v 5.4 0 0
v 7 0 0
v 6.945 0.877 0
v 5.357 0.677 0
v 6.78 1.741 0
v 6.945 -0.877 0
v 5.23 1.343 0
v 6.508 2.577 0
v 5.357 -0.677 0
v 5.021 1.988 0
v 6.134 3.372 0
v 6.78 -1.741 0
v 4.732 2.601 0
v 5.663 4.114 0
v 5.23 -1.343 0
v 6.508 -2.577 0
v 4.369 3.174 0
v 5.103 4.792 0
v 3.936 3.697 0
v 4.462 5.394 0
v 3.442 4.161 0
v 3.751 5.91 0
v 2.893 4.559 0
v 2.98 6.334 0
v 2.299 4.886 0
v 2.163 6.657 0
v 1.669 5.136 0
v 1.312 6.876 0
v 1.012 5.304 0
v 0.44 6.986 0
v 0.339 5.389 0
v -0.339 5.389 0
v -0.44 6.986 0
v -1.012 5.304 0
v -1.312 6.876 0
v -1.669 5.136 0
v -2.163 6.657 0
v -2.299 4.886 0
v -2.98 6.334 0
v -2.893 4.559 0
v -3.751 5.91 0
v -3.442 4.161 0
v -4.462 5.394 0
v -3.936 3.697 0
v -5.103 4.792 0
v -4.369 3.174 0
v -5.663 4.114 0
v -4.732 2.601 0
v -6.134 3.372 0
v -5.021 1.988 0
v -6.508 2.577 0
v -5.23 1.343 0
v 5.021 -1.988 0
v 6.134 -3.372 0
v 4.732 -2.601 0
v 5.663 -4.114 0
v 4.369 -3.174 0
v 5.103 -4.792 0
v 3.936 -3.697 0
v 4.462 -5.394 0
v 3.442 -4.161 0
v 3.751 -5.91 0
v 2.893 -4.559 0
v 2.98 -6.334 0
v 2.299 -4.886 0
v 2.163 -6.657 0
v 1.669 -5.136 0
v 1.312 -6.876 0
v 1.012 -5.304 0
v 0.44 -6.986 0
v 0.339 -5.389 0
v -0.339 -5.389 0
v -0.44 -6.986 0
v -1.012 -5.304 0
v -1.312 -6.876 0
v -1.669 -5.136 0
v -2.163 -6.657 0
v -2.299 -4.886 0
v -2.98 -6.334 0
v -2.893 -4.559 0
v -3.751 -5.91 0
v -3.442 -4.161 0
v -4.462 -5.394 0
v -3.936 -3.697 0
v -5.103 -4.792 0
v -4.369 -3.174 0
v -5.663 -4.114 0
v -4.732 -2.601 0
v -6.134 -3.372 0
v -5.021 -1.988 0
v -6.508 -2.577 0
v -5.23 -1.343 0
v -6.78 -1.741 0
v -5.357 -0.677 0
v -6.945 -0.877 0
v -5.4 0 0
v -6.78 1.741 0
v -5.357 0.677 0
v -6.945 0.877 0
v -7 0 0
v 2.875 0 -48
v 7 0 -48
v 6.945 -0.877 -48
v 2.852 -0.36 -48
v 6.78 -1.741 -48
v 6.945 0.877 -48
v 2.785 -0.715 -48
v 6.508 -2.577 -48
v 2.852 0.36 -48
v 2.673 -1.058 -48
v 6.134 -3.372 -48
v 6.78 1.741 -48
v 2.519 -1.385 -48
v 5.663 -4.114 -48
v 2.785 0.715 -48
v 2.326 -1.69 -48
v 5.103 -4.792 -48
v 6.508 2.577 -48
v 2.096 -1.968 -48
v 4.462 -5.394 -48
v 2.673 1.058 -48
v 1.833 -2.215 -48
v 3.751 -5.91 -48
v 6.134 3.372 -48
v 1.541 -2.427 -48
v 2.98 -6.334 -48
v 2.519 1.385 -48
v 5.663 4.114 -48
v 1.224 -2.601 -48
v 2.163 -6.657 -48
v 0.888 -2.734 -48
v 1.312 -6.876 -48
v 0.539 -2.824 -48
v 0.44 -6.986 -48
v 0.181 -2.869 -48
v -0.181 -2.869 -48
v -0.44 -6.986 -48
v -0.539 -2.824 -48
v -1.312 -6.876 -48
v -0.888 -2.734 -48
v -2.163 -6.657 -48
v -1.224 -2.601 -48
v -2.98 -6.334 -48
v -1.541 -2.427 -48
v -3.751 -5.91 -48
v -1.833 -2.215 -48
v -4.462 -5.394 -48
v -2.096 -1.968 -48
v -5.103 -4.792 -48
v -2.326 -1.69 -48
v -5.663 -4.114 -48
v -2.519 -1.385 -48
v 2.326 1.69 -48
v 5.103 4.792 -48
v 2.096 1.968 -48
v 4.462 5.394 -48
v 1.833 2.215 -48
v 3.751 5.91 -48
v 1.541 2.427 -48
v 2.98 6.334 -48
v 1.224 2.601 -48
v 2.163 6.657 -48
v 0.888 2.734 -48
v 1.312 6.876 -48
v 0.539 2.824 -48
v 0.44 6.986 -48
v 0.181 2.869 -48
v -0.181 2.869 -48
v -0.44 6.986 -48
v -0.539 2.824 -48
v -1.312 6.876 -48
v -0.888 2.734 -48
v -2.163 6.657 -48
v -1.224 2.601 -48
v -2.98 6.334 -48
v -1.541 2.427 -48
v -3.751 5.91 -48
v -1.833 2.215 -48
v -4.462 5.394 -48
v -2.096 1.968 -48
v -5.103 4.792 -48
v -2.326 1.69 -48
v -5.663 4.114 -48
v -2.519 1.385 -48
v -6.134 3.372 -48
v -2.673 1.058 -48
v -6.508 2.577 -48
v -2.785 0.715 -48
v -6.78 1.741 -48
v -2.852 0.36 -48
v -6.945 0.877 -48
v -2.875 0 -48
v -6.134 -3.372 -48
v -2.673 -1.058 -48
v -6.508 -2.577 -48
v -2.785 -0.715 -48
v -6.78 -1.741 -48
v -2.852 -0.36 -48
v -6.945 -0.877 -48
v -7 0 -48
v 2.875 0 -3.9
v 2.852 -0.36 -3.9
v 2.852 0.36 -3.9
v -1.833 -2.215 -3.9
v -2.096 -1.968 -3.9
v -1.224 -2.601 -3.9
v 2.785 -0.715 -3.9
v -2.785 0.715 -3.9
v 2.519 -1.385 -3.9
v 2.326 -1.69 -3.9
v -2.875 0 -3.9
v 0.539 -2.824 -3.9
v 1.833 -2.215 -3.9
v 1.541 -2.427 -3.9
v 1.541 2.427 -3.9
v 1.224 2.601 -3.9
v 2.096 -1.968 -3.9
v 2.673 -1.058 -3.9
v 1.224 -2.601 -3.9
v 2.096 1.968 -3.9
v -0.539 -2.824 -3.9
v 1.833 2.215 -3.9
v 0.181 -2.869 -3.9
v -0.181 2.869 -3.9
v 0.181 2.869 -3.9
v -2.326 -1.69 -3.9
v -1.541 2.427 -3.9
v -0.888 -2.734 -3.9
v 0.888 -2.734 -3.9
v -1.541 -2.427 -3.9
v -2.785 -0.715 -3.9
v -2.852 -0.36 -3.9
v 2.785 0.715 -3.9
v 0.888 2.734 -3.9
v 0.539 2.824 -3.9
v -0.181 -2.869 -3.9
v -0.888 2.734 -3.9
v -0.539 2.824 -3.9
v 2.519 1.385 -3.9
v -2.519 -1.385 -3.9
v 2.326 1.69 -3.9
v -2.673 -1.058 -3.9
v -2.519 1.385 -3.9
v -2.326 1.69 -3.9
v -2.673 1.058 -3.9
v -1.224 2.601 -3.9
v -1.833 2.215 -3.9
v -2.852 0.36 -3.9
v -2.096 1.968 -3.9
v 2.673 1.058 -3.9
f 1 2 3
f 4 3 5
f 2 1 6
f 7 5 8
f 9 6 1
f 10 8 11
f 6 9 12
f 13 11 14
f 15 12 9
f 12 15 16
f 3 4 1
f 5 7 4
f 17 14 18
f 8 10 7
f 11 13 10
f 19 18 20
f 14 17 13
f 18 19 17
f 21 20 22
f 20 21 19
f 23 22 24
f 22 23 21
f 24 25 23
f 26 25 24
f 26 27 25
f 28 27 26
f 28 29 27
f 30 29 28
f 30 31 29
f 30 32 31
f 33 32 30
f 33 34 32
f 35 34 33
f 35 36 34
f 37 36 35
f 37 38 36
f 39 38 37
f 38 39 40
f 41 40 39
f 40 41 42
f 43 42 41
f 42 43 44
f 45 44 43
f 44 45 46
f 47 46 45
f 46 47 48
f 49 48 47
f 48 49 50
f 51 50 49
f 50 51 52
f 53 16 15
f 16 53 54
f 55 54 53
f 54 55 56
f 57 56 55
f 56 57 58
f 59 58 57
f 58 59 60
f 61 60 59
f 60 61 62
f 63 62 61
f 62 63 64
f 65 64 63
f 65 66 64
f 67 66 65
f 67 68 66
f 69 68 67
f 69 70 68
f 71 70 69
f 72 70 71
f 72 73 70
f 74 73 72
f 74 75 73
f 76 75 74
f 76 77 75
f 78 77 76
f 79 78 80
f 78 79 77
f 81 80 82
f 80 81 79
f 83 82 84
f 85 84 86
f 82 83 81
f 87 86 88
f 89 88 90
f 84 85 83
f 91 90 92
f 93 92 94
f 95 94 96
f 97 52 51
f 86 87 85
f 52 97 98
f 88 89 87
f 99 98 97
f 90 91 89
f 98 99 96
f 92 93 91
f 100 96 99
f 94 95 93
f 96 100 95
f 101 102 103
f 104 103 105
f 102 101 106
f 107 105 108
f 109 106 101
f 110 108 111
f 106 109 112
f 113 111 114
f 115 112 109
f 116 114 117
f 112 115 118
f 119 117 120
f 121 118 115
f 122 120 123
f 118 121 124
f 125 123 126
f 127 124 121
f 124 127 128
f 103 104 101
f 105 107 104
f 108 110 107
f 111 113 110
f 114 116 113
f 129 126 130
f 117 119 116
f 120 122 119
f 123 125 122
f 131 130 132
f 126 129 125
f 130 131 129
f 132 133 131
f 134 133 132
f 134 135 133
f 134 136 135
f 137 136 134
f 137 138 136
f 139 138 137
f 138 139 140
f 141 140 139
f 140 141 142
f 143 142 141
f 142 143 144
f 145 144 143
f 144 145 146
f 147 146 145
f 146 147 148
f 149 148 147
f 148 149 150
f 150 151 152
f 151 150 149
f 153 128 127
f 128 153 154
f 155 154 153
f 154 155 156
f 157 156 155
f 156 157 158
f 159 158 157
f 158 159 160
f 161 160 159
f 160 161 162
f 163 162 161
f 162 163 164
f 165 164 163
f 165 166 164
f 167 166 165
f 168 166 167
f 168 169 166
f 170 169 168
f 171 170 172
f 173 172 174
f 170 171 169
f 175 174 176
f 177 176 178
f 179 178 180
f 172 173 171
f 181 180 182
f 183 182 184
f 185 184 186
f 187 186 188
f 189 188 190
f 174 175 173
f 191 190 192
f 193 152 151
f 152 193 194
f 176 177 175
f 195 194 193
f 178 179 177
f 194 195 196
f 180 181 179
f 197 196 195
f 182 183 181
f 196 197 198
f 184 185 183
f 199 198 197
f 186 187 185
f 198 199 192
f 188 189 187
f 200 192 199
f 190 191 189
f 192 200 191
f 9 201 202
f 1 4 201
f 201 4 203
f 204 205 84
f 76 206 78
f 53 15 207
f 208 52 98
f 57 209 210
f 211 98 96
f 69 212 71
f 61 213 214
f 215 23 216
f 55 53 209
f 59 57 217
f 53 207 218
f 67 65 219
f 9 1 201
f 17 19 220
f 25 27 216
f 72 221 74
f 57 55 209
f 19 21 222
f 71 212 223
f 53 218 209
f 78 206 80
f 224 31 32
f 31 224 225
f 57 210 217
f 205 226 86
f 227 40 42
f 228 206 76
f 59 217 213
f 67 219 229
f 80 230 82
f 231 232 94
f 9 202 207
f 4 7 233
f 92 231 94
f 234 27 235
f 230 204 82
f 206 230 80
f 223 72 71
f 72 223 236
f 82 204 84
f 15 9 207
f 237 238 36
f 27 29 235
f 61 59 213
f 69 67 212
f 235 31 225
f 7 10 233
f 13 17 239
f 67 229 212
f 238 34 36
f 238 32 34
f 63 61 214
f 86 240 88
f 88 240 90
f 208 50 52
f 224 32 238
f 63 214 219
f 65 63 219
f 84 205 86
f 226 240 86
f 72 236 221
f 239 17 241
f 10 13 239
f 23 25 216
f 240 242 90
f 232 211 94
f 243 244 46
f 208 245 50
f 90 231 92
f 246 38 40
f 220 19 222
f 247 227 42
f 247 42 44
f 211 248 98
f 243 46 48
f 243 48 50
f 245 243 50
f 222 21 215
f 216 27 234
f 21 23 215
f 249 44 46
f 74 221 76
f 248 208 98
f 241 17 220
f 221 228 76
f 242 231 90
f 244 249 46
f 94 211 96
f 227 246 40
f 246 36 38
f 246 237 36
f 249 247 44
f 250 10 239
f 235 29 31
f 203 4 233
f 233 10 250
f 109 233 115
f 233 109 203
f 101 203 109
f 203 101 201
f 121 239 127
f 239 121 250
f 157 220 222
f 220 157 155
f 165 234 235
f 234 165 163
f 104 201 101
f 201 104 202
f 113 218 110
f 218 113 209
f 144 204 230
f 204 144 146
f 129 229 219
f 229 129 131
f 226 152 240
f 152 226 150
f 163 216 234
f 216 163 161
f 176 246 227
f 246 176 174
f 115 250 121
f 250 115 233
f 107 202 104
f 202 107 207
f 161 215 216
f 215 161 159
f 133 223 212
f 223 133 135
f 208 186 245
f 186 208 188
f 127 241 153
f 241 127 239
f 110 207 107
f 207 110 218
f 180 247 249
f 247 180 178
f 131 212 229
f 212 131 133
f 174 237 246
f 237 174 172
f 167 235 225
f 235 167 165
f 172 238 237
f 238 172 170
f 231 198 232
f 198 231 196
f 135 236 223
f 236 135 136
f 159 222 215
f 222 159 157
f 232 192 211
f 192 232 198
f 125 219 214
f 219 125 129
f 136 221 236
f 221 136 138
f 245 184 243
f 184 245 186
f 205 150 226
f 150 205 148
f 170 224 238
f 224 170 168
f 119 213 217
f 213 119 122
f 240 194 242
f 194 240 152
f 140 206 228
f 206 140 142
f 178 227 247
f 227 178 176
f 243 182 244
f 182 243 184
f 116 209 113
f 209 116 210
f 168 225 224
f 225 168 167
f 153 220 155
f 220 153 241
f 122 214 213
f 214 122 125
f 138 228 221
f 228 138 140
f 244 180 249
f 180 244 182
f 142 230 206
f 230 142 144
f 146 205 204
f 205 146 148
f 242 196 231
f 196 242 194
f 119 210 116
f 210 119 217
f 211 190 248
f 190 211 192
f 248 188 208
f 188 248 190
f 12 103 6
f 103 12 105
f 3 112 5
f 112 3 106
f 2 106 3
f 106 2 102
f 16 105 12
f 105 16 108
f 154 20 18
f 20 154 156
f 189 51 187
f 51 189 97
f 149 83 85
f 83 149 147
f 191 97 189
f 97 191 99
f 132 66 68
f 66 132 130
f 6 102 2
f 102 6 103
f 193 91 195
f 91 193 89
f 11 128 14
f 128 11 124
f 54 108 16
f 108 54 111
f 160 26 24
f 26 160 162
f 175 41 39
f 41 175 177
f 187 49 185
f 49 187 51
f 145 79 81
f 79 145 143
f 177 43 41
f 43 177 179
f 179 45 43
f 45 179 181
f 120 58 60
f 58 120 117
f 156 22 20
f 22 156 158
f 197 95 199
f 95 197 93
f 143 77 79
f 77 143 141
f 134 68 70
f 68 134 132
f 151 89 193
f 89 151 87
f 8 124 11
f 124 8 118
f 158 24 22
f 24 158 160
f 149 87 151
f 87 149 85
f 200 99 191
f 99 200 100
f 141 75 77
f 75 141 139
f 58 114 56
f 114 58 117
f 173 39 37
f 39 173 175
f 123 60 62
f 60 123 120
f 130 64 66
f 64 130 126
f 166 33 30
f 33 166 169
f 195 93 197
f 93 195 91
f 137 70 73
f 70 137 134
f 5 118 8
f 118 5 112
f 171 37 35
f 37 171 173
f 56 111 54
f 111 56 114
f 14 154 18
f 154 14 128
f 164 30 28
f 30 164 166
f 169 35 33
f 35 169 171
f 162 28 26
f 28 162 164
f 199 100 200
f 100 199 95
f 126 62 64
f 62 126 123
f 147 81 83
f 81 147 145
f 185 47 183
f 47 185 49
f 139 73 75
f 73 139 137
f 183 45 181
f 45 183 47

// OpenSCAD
$fn = 50;


difference() {
	union() {
		translate(v = [0, 0, -48.0000000000]) {
			cylinder(h = 48, r = 7.0000000000);
		}
		cylinder(h = 0, r = 17.0000000000);
	}
	union() {
		translate(v = [0, 0, 0]) {
			rotate(a = [0, 0, 0]) {
				difference() {
					union() {
						#translate(v = [0, 0, -48.0000000000]) {
							cylinder(h = 48, r = 2.6000000000);
						}
						#translate(v = [0, 0, -3.9000000000]) {
							cylinder(h = 3.9000000000, r1 = 2.8750000000, r2 = 5.4000000000);
						}
						#translate(v = [0, 0, -48.0000000000]) {
							cylinder(h = 48, r = 2.8750000000);
						}
						#translate(v = [0, 0, -48.0000000000]) {
							cylinder(h = 48, r = 2.6000000000);
						}
					}
					union();
				}
			}
		}
	}
}
